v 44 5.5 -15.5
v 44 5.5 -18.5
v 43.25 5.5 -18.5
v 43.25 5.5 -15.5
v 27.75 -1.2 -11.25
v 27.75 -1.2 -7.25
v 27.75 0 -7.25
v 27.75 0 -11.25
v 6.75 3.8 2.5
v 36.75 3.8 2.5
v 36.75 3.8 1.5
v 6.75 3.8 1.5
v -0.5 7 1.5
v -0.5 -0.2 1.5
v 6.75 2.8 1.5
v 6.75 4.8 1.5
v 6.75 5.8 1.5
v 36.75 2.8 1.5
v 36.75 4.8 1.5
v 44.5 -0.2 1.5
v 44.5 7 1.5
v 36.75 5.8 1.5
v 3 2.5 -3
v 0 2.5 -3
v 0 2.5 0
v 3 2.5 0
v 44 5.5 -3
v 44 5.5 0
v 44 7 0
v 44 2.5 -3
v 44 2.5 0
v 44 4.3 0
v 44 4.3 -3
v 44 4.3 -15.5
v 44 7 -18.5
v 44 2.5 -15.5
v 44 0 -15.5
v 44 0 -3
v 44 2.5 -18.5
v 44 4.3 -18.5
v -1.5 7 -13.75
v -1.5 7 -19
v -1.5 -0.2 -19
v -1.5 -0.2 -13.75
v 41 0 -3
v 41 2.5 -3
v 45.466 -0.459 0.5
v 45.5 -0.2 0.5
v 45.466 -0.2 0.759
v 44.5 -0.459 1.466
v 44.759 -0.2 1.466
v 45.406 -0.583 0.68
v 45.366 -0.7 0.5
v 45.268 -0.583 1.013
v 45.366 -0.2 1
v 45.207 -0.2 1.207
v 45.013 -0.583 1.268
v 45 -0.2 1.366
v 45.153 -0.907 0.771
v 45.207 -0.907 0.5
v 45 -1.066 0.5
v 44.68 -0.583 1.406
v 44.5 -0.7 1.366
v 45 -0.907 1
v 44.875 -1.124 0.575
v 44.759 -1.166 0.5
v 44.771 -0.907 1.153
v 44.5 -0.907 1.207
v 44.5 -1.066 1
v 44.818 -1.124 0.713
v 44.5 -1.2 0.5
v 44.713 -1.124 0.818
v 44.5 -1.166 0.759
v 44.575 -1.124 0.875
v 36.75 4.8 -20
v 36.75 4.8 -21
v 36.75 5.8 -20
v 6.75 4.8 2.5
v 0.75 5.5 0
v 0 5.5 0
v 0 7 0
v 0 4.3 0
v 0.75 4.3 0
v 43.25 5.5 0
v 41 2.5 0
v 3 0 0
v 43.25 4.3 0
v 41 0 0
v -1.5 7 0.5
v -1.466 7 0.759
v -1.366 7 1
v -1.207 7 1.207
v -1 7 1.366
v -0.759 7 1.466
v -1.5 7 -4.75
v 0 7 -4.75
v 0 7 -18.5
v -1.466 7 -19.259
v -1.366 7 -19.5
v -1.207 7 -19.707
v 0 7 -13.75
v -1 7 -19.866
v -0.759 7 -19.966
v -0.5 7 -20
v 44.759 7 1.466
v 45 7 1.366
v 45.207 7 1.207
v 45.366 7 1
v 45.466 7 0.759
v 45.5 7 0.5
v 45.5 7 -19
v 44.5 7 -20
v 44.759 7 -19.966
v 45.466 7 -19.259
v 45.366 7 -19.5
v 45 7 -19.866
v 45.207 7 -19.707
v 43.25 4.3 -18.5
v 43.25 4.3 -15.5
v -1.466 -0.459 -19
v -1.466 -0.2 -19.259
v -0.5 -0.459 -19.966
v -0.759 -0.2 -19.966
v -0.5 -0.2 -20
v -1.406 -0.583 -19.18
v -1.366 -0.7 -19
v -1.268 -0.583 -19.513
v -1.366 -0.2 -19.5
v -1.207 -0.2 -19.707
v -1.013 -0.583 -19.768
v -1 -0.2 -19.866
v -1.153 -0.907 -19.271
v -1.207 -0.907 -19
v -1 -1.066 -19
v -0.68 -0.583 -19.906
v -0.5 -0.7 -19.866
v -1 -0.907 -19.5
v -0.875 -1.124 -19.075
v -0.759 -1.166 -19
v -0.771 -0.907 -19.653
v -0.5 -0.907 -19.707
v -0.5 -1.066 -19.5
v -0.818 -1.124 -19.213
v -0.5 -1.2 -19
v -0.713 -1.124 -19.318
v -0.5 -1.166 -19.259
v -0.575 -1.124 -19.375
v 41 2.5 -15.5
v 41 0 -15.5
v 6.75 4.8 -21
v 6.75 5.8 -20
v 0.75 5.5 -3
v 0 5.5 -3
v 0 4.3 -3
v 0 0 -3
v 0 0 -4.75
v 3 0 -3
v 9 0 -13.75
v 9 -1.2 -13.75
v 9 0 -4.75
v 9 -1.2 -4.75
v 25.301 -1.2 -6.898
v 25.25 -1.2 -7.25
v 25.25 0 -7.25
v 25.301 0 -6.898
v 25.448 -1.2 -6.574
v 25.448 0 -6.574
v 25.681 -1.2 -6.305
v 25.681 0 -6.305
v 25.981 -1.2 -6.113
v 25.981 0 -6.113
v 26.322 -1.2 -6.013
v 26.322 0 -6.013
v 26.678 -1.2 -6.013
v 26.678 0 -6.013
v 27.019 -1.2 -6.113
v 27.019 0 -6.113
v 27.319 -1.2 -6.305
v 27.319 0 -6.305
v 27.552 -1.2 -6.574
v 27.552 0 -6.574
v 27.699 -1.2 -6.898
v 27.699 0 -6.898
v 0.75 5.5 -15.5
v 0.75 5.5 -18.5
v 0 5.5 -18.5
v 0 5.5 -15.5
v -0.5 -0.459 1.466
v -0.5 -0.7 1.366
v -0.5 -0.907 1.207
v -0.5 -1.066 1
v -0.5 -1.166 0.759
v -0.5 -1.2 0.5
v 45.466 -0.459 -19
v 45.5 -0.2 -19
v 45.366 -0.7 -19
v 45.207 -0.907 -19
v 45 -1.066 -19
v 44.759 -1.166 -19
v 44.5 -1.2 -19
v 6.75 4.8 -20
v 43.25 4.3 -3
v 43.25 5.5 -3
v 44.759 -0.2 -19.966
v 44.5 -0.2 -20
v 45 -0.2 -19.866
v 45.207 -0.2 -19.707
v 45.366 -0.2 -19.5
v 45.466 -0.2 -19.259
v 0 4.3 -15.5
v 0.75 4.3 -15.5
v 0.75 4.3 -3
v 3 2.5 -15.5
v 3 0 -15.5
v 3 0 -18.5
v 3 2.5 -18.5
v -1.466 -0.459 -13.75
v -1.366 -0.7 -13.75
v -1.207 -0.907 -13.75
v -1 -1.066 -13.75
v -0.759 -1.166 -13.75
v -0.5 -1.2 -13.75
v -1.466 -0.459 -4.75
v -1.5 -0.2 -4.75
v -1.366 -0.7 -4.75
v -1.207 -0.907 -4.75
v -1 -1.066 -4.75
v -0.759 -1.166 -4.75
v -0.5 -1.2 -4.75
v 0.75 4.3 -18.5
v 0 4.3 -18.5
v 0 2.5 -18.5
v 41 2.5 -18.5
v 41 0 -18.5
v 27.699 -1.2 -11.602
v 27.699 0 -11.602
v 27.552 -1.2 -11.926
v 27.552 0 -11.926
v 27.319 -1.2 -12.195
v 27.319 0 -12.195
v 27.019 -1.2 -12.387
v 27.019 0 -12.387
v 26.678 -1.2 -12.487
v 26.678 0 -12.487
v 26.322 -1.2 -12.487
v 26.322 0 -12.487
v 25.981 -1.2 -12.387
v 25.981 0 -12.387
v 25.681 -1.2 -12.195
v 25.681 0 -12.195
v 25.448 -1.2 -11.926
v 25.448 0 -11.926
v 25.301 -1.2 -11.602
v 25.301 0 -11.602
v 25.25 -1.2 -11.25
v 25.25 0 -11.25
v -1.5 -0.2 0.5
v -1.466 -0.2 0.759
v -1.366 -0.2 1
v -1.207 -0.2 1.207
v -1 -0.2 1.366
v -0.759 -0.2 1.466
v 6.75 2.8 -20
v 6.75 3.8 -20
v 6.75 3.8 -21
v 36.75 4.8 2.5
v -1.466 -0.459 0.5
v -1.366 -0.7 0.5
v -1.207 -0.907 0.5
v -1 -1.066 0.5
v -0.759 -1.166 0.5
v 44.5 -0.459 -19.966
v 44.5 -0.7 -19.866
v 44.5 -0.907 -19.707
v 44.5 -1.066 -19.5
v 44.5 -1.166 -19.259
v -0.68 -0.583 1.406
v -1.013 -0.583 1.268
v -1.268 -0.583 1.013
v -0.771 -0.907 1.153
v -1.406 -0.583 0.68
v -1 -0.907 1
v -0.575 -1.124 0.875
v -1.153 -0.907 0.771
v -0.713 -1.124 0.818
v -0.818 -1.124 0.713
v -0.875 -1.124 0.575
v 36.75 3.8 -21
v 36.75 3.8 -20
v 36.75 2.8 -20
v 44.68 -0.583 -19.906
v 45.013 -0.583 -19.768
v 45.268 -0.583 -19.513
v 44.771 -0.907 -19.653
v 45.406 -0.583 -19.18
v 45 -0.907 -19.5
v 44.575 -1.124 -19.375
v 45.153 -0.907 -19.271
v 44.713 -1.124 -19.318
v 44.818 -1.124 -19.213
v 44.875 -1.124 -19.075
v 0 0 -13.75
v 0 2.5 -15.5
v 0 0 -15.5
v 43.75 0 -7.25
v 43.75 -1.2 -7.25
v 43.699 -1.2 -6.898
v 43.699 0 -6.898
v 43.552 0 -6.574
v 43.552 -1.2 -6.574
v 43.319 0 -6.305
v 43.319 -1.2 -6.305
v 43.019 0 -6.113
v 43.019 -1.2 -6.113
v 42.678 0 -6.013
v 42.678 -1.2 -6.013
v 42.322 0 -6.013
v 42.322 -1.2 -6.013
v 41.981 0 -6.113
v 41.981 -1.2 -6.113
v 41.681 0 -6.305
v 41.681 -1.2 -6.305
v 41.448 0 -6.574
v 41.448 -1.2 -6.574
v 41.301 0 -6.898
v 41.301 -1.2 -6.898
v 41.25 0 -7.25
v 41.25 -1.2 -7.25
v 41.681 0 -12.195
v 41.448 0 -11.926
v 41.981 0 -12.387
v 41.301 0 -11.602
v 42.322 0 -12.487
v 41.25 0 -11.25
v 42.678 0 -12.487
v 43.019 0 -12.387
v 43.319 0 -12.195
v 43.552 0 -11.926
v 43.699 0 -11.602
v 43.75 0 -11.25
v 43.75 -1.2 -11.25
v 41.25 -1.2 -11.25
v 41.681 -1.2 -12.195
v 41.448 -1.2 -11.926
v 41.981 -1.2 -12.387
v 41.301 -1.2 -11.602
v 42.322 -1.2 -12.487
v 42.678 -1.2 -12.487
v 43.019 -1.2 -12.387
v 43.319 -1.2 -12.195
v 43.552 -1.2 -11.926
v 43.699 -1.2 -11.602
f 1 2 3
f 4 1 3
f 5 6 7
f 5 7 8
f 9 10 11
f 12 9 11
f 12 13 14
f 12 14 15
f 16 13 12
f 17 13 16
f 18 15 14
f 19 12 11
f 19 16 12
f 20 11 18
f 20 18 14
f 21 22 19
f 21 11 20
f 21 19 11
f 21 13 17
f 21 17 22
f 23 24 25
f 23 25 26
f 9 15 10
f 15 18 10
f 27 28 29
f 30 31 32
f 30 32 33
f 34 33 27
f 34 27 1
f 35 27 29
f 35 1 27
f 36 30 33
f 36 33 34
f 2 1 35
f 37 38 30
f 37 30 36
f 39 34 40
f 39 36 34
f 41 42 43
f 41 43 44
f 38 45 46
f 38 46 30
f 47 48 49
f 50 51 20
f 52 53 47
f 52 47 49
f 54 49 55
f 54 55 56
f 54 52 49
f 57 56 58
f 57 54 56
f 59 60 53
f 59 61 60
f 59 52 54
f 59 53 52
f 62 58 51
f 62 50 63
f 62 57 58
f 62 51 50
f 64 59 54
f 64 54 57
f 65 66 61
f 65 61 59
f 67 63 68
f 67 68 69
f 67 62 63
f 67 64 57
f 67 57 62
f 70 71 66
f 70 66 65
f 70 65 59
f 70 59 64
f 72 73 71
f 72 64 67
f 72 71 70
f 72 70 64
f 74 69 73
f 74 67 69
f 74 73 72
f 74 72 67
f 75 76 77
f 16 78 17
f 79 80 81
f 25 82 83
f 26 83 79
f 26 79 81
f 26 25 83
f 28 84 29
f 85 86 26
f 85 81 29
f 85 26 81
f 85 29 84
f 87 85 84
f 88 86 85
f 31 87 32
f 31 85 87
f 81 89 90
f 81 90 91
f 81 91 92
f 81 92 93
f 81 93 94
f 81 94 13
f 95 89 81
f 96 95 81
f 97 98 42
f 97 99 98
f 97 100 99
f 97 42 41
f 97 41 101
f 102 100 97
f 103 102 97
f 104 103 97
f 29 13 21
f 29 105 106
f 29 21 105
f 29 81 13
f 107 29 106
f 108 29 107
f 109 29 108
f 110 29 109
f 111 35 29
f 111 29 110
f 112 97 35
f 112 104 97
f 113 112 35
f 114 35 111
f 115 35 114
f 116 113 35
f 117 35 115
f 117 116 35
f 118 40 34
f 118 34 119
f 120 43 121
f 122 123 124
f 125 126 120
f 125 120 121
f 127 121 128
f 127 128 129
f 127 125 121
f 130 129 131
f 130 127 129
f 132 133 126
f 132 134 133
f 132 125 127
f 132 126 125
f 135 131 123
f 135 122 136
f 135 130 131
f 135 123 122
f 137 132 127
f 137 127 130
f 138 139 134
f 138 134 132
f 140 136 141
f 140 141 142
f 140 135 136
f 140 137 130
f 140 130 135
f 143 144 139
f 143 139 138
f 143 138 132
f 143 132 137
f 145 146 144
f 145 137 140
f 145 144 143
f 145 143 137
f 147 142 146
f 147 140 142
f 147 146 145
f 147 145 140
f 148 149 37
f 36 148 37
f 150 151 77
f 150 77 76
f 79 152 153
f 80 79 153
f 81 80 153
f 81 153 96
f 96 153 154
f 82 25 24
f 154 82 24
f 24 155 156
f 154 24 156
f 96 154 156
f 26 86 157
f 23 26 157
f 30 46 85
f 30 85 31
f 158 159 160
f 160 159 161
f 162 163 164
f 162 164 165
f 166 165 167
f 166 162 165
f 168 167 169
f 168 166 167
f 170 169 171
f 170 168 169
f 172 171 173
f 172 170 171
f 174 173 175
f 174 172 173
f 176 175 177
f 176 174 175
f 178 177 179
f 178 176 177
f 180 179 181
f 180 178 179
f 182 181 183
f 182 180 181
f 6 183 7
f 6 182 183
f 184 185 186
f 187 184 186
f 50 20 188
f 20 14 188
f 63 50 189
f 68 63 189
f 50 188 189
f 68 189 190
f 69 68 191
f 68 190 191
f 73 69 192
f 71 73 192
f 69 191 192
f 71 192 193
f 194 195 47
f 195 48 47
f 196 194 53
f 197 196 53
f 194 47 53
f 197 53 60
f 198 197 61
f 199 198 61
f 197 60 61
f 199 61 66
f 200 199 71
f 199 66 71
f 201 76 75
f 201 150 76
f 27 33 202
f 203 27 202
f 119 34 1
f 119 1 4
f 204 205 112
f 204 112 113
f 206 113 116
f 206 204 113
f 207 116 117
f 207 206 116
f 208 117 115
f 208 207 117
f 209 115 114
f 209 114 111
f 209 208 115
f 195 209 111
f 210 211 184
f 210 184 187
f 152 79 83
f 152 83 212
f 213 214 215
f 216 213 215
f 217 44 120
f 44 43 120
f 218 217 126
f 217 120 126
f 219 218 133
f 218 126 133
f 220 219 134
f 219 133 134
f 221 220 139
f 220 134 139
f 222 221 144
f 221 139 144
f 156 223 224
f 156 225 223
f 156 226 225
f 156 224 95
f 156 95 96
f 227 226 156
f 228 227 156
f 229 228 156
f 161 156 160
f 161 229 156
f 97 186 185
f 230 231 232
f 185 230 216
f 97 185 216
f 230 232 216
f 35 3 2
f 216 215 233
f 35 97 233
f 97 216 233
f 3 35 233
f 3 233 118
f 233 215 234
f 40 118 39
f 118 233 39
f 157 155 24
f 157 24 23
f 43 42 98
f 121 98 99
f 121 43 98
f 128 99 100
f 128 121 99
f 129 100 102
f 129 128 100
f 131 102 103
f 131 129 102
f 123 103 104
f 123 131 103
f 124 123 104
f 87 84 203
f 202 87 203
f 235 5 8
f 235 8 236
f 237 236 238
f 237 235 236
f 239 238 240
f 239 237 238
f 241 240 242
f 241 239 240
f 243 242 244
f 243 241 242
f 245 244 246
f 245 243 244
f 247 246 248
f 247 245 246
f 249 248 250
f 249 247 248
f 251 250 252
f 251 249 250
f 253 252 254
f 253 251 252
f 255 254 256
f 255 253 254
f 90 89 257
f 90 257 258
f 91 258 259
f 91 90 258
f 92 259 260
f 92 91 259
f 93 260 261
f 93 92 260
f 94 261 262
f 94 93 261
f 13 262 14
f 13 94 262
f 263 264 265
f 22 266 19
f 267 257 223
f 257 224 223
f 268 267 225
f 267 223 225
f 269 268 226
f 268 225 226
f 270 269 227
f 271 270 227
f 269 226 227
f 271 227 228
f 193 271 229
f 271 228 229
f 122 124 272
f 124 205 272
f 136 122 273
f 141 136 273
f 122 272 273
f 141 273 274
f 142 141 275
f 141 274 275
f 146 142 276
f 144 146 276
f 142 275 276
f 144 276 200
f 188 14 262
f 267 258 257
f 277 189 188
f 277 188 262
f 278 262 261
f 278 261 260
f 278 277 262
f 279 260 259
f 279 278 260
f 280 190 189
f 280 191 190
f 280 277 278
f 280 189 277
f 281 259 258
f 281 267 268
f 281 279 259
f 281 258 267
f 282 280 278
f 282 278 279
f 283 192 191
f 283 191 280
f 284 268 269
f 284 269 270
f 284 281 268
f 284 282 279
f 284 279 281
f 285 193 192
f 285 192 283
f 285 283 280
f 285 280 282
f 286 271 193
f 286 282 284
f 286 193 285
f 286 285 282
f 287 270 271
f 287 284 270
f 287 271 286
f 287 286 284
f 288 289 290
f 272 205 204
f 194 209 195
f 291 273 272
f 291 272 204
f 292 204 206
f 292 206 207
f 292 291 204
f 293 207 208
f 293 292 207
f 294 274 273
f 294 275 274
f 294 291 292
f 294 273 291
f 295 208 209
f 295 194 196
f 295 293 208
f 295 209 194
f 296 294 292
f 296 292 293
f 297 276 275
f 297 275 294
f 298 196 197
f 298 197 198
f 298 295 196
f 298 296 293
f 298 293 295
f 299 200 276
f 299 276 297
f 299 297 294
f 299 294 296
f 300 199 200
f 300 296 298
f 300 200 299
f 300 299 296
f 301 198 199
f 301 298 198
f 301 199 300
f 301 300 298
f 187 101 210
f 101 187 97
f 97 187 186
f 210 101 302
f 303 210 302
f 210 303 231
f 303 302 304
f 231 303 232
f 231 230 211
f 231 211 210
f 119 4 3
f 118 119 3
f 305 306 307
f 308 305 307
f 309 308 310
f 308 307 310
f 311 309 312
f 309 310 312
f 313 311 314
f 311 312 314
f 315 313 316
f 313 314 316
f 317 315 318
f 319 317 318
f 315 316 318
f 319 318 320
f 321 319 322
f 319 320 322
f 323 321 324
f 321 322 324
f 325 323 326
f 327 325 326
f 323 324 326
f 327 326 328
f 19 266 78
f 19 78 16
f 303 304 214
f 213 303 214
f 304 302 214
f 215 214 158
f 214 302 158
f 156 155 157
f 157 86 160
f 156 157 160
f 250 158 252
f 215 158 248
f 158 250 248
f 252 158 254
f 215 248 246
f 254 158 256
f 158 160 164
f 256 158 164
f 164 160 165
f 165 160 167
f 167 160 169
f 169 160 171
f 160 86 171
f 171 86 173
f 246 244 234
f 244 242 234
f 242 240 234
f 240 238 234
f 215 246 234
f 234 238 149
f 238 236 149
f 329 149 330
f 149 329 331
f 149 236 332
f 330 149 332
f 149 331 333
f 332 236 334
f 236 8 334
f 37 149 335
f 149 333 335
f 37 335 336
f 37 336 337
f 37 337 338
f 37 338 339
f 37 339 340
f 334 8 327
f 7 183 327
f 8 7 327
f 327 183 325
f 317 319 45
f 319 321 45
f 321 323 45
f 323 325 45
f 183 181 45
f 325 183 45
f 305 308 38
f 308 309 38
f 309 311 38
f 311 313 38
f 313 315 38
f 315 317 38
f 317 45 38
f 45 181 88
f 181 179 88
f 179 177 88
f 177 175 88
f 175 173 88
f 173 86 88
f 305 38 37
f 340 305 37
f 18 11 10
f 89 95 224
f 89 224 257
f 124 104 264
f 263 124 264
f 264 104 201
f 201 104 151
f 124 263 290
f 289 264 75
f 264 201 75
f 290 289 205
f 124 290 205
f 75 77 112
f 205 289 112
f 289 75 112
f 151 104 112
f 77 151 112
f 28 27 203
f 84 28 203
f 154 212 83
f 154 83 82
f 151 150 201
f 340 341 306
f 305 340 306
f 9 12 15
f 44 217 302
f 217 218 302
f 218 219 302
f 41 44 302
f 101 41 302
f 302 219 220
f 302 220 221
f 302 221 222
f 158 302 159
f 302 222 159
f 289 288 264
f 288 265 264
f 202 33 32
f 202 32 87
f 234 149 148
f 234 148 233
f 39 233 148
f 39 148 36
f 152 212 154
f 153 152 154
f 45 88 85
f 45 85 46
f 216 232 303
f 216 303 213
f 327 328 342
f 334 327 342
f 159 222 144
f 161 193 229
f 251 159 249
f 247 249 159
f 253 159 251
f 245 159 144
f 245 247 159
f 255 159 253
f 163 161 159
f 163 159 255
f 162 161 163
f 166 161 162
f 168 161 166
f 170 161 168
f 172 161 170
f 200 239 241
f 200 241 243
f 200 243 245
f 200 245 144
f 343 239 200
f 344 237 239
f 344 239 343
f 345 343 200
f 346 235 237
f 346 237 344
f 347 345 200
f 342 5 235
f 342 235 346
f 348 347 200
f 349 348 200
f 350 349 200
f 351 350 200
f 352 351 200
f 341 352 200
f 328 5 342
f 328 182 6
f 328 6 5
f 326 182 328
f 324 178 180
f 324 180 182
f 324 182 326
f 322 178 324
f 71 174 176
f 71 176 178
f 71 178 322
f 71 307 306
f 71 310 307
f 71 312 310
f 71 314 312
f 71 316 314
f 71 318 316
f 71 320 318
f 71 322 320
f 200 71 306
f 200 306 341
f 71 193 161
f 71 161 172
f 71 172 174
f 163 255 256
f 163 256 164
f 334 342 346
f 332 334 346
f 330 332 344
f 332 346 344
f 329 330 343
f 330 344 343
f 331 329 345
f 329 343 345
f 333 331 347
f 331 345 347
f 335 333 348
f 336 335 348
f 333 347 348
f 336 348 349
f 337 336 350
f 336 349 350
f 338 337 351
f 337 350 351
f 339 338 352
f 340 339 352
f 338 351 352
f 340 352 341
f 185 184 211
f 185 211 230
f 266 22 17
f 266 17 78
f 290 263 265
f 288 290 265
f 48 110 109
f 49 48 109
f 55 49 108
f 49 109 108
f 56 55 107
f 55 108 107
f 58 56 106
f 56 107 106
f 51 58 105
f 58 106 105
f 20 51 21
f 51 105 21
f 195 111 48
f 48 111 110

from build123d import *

# Parameters (mm, degrees)
SKETCH1_W                = 47
SKETCH1_H                = 21.5
SKETCH1_W_2              = 44
SKETCH1_H_2              = 18.5
EXTRUDE_THIN1_DEPTH      = 7
SKETCH2_W                = 47
SKETCH2_H                = 21.5
BOSS_EXTRUDE1_DEPTH      = 1.2
SKETCH3_W                = 21
SKETCH3_H                = 9
CUT_EXTRUDE1_DEPTH       = 9.2
CUT_EXTRUDE2_DEPTH       = 9.2
SKETCH5_W                = 44
SKETCH5_H                = 18.5
BOSS_EXTRUDE2_DEPTH      = 1.2
SKETCH6_W                = 44
SKETCH6_H                = 12.5
CUT_EXTRUDE3_DEPTH       = 1.2
SKETCH9_W                = 42.5
SKETCH9_H                = 18.5
CUT_EXTRUDE4_DEPTH       = 3
BOSS_EXTRUDE3_DEPTH      = 15
BOSS_EXTRUDE3_DEPTH_BACK = 15
SKETCH13_W               = 3
SKETCH13_H               = 3
BOSS_EXTRUDE4_DEPTH      = 2.5
FILLET1_R                = 1
FILLET2_R                = 1


with BuildPart() as part:
    # Sketch1 → Extrude-Thin1 (new body)
    with BuildSketch(Plane(origin=(0, 0, 0), x_dir=(1, 0, 0), z_dir=(0, 1, 0))):
        with Locations((22, 9.25)):
            Rectangle(SKETCH1_W, SKETCH1_H)
        with Locations((22, 9.25)):
            Rectangle(SKETCH1_W_2, SKETCH1_H_2, mode=Mode.SUBTRACT)
    extrude(amount=EXTRUDE_THIN1_DEPTH)

    # Sketch2 → Boss-Extrude1 (add)
    with BuildSketch(Plane.XZ):
        with Locations((22, -9.25)):
            Rectangle(SKETCH2_W, SKETCH2_H)
    extrude(amount=BOSS_EXTRUDE1_DEPTH)

    # Sketch3 → Cut-Extrude1 (cut, through all)
    with BuildSketch(Plane.XZ.offset(1.2)):
        with Locations((-1.5, -9.25)):
            Rectangle(SKETCH3_W, SKETCH3_H)
    extrude(amount=-CUT_EXTRUDE1_DEPTH, mode=Mode.SUBTRACT)

    # Sketch4 → Cut-Extrude2 (cut, through all)
    with BuildSketch(Plane.XZ.offset(1.2)):
        with BuildLine():
            Line((25.25, -11.25), (25.25, -7.25))
            ThreePointArc((25.25, -7.25), (26.5, -6), (27.75, -7.25))
            Line((27.75, -7.25), (27.75, -11.25))
            ThreePointArc((27.75, -11.25), (26.5, -12.5), (25.25, -11.25))
        make_face()
        with BuildLine():
            Line((43.75, -11.25), (43.75, -7.25))
            ThreePointArc((43.75, -7.25), (42.5, -6), (41.25, -7.25))
            Line((41.25, -7.25), (41.25, -11.25))
            ThreePointArc((41.25, -11.25), (42.5, -12.5), (43.75, -11.25))
        make_face()
    extrude(amount=-CUT_EXTRUDE2_DEPTH, mode=Mode.SUBTRACT)

    # Sketch5 → Boss-Extrude2 (add)
    with BuildSketch(Plane(origin=(0, 5.5, 0), x_dir=(-1, 0, 0), z_dir=(0, -1, 0))):
        with Locations((-22, 9.25)):
            Rectangle(SKETCH5_W, SKETCH5_H)
    extrude(amount=BOSS_EXTRUDE2_DEPTH)

    # Sketch6 → Cut-Extrude3 (cut)
    with BuildSketch(Plane(origin=(0, 4.3, 0), x_dir=(-1, 0, 0), z_dir=(0, -1, 0))):
        with Locations((-22, 9.25)):
            Rectangle(SKETCH6_W, SKETCH6_H)
    extrude(amount=-CUT_EXTRUDE3_DEPTH, mode=Mode.SUBTRACT)

    # Sketch9 → Cut-Extrude4 (cut)
    with BuildSketch(Plane(origin=(0, 5.5, 0), x_dir=(1, 0, 0), z_dir=(0, 1, 0))):
        with Locations((22, 9.25)):
            Rectangle(SKETCH9_W, SKETCH9_H)
    extrude(amount=-CUT_EXTRUDE4_DEPTH, mode=Mode.SUBTRACT)

    # Sketch10 → Boss-Extrude3 (add, two sides)
    with BuildSketch(Plane.ZY.offset(-21.75)) as boss_extrude3_sk:
        Polygon((-20, 2.8), (-21, 3.8), (-20, 3.8), align=None)
        Polygon((2.5, 3.8), (1.5, 3.8), (1.5, 2.8), align=None)
        Polygon((1.5, 5.8), (2.5, 4.8), (1.5, 4.8), align=None)
        Polygon((-21, 4.8), (-20, 4.8), (-20, 5.8), align=None)
    extrude(amount=BOSS_EXTRUDE3_DEPTH)
    extrude(boss_extrude3_sk.sketch, amount=-BOSS_EXTRUDE3_DEPTH_BACK)

    # Sketch13 → Boss-Extrude4 (add)
    with BuildSketch(Plane(origin=(0, 0, 0), x_dir=(1, 0, 0), z_dir=(0, 1, 0))):
        with Locations((1.5, 1.5)):
            Rectangle(SKETCH13_W, SKETCH13_H)
        with Locations((42.5, 17)):
            Rectangle(SKETCH13_W, SKETCH13_H)
        with Locations((42.5, 1.5)):
            Rectangle(SKETCH13_W, SKETCH13_H)
        with Locations((1.5, 17)):
            Rectangle(SKETCH13_W, SKETCH13_H)
    extrude(amount=BOSS_EXTRUDE4_DEPTH)

    # Fillet1
    fillet1_edges = [part.edges().sort_by_distance(p)[0] for p in [
        (-1.5, 2.9, -20),
        (45.5, 2.9, -20),
        (45.5, 2.9, 1.5),
        (-1.5, 2.9, 1.5),
    ]]
    fillet(fillet1_edges, radius=FILLET1_R)

    # Fillet2
    fillet2_edges = [part.edges().sort_by_distance(p)[0] for p in [
        (22, -1.2, -20),
        (45.5, -1.2, -9.25),
        (22, -1.2, 1.5),
        (-1.5, -1.2, -2.125),
        (-1.207106781, -1.2, 1.207106781),
        (45.207106781, -1.2, 1.207106781),
        (45.207106781, -1.2, -19.707106781),
        (-1.207106781, -1.2, -19.707106781),
        (-1.5, -1.2, -16.375),
    ]]
    fillet(fillet2_edges, radius=FILLET2_R)


solid = part.part
